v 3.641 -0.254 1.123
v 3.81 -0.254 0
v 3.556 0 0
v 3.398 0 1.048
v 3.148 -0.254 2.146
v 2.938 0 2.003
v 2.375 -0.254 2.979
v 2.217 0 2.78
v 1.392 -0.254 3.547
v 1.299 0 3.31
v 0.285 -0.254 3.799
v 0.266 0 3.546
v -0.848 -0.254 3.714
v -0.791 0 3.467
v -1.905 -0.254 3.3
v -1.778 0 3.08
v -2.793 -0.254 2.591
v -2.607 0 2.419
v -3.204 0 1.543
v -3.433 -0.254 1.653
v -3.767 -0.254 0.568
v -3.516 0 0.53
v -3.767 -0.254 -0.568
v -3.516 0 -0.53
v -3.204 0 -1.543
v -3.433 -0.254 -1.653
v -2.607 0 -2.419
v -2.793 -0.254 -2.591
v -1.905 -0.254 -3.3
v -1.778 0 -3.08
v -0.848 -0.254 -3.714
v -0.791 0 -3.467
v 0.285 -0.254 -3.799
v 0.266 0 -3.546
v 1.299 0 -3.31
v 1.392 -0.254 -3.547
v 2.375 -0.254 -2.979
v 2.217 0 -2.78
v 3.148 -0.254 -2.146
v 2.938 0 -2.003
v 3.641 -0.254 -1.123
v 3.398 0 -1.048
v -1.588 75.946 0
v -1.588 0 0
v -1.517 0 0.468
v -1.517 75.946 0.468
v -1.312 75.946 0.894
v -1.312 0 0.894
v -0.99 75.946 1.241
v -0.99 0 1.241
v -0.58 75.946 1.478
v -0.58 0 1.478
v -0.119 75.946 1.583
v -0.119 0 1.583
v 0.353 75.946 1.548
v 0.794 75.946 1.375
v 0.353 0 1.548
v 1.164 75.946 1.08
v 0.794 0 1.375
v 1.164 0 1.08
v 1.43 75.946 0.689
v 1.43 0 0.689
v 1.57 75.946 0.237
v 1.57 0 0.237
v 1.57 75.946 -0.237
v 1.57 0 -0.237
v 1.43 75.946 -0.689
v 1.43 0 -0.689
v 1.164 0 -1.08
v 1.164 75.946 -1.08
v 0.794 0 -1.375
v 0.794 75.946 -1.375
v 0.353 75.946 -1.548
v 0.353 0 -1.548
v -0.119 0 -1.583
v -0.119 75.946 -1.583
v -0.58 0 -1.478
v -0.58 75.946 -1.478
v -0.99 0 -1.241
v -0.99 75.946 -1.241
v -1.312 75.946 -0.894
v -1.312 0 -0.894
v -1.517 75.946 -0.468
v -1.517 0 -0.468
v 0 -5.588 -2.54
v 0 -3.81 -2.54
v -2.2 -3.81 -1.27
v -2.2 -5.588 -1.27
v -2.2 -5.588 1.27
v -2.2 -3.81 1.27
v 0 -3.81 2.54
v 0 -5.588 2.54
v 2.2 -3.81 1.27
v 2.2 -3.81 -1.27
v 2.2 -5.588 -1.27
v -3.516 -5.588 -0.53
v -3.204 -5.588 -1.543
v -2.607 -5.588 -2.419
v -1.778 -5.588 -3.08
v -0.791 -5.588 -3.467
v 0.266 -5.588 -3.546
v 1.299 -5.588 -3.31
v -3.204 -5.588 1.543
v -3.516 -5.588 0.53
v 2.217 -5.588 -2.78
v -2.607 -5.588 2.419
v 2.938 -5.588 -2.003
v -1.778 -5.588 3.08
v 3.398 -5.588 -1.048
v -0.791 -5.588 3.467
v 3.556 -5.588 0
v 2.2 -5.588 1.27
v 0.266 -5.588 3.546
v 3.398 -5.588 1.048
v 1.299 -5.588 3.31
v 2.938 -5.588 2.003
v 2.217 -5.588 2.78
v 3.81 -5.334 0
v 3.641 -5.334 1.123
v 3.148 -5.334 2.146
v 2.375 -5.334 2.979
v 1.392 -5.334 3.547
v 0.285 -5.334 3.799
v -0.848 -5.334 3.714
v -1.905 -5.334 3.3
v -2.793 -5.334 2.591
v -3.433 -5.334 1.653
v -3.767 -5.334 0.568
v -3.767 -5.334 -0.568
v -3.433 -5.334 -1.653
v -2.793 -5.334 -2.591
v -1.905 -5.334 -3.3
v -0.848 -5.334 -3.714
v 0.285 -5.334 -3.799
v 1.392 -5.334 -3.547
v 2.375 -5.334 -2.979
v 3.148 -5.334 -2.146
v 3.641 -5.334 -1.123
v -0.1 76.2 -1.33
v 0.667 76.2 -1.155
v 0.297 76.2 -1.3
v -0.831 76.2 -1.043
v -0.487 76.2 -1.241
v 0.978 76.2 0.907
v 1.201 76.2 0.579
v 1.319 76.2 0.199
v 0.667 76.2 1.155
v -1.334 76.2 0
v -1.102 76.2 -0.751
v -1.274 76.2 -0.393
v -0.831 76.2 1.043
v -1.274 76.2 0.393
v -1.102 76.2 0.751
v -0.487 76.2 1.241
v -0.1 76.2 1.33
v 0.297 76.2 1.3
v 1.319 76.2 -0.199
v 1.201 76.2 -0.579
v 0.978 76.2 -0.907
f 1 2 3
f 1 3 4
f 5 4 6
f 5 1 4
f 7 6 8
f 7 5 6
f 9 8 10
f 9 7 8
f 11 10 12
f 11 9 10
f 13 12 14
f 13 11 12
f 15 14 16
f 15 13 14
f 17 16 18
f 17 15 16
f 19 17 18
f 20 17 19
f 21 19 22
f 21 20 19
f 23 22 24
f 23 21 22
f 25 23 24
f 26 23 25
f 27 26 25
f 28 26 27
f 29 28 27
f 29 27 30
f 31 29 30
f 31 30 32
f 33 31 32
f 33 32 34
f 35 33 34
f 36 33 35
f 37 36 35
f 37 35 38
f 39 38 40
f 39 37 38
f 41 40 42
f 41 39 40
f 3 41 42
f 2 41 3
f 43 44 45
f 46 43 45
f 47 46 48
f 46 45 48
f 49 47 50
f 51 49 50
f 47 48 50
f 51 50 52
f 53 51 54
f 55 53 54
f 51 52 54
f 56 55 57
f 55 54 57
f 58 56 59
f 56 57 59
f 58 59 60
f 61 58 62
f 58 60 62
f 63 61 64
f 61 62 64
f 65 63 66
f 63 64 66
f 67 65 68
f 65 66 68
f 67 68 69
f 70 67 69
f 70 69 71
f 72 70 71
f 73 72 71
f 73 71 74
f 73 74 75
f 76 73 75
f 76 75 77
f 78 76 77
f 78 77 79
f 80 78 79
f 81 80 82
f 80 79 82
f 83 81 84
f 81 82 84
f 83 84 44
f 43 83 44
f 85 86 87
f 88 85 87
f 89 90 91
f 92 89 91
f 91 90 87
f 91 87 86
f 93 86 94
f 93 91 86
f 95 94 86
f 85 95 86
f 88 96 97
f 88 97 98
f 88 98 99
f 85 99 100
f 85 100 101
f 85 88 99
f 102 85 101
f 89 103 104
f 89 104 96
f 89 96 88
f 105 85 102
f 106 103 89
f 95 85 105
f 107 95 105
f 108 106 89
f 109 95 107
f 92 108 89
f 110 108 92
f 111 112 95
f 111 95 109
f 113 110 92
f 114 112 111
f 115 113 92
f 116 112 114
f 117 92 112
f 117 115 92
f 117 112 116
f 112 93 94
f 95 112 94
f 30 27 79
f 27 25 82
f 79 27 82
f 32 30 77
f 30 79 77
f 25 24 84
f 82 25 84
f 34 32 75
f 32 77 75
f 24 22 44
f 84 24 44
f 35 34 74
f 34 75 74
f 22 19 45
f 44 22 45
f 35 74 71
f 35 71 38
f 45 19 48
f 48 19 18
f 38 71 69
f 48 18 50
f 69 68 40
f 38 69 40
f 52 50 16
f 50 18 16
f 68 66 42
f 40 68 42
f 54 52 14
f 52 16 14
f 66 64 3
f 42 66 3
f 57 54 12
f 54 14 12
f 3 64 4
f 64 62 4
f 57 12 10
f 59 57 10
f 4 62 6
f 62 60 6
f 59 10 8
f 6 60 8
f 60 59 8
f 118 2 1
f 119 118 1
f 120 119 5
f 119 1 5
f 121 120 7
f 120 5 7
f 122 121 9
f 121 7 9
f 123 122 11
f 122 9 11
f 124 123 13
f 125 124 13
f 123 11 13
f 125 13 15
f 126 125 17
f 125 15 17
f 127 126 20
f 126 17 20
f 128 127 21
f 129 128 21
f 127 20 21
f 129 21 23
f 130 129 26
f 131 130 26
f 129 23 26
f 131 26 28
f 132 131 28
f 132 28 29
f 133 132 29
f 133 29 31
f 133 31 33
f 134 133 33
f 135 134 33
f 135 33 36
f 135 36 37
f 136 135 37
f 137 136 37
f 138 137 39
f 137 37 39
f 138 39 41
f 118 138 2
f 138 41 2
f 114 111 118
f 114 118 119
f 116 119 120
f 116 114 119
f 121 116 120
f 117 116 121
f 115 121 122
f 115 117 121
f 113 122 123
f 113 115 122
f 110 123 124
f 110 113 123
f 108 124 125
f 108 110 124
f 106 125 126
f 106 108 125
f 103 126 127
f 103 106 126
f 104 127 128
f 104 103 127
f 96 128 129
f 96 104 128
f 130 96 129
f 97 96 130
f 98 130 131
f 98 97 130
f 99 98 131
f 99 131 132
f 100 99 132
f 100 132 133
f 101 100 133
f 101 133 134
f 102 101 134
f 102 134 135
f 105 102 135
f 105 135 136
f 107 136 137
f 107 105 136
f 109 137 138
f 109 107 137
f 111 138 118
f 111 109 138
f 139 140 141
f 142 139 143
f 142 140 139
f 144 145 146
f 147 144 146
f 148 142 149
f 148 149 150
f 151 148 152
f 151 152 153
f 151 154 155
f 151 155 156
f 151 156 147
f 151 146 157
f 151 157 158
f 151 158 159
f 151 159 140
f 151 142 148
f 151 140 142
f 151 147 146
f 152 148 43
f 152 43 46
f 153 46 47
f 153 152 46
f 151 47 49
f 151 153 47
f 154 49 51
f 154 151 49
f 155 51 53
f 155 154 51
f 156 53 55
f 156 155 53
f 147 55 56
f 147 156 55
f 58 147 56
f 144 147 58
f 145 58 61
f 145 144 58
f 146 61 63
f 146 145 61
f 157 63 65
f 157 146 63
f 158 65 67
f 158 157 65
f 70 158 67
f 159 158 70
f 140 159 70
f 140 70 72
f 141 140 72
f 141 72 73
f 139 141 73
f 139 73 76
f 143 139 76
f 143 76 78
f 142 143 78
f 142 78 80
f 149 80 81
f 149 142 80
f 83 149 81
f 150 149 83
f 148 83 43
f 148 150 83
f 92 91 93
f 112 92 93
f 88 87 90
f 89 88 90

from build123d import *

# Parameters (mm, degrees)
F0_R     = 3.81
F1_DEPTH = 5.588
F2_DEPTH = 3.81
F3_R     = 1.5875
F4_DEPTH = 76.2
F5_SIZE  = 0.254
F6_SIZE  = 0.254


with BuildPart() as f1:
    # F0 (on Front) → F1 (new body)
    with BuildSketch(Plane.XZ):
        Circle(F0_R)
        Polygon((0, 2.54), (2.199705, 1.27), (2.199705, -1.27), (0, -2.54), (-2.199705, -1.27), (-2.199705, 1.27), align=None, mode=Mode.SUBTRACT)
    extrude(amount=F1_DEPTH)

    # F0 (on Front) → F2 (join)
    with BuildSketch(Plane.XZ):
        Polygon((2.199705, -1.27), (2.199705, 1.27), (0, 2.54), (-2.199705, 1.27), (-2.199705, -1.27), (0, -2.54), align=None)
    extrude(amount=F2_DEPTH)

    # F3 (on face) → F4 (join)
    with BuildSketch(Plane(origin=(0, 0, 0), x_dir=(-1, 0, 0), z_dir=(0, 1, 0))):
        Circle(F3_R)
    extrude(amount=F4_DEPTH)

    # F5
    f5_edges = [f1.edges().sort_by_distance(p)[0] for p in [
        (-3.81, -5.588, 0),
        (-3.81, 0, 0),
    ]]
    chamfer(f5_edges, length=F5_SIZE)

    # F6
    f6_edges = [f1.edges().sort_by_distance(p)[0] for p in [
        (1.5875, 76.2, 0),
    ]]
    chamfer(f6_edges, length=F6_SIZE)


solid = f1.part
